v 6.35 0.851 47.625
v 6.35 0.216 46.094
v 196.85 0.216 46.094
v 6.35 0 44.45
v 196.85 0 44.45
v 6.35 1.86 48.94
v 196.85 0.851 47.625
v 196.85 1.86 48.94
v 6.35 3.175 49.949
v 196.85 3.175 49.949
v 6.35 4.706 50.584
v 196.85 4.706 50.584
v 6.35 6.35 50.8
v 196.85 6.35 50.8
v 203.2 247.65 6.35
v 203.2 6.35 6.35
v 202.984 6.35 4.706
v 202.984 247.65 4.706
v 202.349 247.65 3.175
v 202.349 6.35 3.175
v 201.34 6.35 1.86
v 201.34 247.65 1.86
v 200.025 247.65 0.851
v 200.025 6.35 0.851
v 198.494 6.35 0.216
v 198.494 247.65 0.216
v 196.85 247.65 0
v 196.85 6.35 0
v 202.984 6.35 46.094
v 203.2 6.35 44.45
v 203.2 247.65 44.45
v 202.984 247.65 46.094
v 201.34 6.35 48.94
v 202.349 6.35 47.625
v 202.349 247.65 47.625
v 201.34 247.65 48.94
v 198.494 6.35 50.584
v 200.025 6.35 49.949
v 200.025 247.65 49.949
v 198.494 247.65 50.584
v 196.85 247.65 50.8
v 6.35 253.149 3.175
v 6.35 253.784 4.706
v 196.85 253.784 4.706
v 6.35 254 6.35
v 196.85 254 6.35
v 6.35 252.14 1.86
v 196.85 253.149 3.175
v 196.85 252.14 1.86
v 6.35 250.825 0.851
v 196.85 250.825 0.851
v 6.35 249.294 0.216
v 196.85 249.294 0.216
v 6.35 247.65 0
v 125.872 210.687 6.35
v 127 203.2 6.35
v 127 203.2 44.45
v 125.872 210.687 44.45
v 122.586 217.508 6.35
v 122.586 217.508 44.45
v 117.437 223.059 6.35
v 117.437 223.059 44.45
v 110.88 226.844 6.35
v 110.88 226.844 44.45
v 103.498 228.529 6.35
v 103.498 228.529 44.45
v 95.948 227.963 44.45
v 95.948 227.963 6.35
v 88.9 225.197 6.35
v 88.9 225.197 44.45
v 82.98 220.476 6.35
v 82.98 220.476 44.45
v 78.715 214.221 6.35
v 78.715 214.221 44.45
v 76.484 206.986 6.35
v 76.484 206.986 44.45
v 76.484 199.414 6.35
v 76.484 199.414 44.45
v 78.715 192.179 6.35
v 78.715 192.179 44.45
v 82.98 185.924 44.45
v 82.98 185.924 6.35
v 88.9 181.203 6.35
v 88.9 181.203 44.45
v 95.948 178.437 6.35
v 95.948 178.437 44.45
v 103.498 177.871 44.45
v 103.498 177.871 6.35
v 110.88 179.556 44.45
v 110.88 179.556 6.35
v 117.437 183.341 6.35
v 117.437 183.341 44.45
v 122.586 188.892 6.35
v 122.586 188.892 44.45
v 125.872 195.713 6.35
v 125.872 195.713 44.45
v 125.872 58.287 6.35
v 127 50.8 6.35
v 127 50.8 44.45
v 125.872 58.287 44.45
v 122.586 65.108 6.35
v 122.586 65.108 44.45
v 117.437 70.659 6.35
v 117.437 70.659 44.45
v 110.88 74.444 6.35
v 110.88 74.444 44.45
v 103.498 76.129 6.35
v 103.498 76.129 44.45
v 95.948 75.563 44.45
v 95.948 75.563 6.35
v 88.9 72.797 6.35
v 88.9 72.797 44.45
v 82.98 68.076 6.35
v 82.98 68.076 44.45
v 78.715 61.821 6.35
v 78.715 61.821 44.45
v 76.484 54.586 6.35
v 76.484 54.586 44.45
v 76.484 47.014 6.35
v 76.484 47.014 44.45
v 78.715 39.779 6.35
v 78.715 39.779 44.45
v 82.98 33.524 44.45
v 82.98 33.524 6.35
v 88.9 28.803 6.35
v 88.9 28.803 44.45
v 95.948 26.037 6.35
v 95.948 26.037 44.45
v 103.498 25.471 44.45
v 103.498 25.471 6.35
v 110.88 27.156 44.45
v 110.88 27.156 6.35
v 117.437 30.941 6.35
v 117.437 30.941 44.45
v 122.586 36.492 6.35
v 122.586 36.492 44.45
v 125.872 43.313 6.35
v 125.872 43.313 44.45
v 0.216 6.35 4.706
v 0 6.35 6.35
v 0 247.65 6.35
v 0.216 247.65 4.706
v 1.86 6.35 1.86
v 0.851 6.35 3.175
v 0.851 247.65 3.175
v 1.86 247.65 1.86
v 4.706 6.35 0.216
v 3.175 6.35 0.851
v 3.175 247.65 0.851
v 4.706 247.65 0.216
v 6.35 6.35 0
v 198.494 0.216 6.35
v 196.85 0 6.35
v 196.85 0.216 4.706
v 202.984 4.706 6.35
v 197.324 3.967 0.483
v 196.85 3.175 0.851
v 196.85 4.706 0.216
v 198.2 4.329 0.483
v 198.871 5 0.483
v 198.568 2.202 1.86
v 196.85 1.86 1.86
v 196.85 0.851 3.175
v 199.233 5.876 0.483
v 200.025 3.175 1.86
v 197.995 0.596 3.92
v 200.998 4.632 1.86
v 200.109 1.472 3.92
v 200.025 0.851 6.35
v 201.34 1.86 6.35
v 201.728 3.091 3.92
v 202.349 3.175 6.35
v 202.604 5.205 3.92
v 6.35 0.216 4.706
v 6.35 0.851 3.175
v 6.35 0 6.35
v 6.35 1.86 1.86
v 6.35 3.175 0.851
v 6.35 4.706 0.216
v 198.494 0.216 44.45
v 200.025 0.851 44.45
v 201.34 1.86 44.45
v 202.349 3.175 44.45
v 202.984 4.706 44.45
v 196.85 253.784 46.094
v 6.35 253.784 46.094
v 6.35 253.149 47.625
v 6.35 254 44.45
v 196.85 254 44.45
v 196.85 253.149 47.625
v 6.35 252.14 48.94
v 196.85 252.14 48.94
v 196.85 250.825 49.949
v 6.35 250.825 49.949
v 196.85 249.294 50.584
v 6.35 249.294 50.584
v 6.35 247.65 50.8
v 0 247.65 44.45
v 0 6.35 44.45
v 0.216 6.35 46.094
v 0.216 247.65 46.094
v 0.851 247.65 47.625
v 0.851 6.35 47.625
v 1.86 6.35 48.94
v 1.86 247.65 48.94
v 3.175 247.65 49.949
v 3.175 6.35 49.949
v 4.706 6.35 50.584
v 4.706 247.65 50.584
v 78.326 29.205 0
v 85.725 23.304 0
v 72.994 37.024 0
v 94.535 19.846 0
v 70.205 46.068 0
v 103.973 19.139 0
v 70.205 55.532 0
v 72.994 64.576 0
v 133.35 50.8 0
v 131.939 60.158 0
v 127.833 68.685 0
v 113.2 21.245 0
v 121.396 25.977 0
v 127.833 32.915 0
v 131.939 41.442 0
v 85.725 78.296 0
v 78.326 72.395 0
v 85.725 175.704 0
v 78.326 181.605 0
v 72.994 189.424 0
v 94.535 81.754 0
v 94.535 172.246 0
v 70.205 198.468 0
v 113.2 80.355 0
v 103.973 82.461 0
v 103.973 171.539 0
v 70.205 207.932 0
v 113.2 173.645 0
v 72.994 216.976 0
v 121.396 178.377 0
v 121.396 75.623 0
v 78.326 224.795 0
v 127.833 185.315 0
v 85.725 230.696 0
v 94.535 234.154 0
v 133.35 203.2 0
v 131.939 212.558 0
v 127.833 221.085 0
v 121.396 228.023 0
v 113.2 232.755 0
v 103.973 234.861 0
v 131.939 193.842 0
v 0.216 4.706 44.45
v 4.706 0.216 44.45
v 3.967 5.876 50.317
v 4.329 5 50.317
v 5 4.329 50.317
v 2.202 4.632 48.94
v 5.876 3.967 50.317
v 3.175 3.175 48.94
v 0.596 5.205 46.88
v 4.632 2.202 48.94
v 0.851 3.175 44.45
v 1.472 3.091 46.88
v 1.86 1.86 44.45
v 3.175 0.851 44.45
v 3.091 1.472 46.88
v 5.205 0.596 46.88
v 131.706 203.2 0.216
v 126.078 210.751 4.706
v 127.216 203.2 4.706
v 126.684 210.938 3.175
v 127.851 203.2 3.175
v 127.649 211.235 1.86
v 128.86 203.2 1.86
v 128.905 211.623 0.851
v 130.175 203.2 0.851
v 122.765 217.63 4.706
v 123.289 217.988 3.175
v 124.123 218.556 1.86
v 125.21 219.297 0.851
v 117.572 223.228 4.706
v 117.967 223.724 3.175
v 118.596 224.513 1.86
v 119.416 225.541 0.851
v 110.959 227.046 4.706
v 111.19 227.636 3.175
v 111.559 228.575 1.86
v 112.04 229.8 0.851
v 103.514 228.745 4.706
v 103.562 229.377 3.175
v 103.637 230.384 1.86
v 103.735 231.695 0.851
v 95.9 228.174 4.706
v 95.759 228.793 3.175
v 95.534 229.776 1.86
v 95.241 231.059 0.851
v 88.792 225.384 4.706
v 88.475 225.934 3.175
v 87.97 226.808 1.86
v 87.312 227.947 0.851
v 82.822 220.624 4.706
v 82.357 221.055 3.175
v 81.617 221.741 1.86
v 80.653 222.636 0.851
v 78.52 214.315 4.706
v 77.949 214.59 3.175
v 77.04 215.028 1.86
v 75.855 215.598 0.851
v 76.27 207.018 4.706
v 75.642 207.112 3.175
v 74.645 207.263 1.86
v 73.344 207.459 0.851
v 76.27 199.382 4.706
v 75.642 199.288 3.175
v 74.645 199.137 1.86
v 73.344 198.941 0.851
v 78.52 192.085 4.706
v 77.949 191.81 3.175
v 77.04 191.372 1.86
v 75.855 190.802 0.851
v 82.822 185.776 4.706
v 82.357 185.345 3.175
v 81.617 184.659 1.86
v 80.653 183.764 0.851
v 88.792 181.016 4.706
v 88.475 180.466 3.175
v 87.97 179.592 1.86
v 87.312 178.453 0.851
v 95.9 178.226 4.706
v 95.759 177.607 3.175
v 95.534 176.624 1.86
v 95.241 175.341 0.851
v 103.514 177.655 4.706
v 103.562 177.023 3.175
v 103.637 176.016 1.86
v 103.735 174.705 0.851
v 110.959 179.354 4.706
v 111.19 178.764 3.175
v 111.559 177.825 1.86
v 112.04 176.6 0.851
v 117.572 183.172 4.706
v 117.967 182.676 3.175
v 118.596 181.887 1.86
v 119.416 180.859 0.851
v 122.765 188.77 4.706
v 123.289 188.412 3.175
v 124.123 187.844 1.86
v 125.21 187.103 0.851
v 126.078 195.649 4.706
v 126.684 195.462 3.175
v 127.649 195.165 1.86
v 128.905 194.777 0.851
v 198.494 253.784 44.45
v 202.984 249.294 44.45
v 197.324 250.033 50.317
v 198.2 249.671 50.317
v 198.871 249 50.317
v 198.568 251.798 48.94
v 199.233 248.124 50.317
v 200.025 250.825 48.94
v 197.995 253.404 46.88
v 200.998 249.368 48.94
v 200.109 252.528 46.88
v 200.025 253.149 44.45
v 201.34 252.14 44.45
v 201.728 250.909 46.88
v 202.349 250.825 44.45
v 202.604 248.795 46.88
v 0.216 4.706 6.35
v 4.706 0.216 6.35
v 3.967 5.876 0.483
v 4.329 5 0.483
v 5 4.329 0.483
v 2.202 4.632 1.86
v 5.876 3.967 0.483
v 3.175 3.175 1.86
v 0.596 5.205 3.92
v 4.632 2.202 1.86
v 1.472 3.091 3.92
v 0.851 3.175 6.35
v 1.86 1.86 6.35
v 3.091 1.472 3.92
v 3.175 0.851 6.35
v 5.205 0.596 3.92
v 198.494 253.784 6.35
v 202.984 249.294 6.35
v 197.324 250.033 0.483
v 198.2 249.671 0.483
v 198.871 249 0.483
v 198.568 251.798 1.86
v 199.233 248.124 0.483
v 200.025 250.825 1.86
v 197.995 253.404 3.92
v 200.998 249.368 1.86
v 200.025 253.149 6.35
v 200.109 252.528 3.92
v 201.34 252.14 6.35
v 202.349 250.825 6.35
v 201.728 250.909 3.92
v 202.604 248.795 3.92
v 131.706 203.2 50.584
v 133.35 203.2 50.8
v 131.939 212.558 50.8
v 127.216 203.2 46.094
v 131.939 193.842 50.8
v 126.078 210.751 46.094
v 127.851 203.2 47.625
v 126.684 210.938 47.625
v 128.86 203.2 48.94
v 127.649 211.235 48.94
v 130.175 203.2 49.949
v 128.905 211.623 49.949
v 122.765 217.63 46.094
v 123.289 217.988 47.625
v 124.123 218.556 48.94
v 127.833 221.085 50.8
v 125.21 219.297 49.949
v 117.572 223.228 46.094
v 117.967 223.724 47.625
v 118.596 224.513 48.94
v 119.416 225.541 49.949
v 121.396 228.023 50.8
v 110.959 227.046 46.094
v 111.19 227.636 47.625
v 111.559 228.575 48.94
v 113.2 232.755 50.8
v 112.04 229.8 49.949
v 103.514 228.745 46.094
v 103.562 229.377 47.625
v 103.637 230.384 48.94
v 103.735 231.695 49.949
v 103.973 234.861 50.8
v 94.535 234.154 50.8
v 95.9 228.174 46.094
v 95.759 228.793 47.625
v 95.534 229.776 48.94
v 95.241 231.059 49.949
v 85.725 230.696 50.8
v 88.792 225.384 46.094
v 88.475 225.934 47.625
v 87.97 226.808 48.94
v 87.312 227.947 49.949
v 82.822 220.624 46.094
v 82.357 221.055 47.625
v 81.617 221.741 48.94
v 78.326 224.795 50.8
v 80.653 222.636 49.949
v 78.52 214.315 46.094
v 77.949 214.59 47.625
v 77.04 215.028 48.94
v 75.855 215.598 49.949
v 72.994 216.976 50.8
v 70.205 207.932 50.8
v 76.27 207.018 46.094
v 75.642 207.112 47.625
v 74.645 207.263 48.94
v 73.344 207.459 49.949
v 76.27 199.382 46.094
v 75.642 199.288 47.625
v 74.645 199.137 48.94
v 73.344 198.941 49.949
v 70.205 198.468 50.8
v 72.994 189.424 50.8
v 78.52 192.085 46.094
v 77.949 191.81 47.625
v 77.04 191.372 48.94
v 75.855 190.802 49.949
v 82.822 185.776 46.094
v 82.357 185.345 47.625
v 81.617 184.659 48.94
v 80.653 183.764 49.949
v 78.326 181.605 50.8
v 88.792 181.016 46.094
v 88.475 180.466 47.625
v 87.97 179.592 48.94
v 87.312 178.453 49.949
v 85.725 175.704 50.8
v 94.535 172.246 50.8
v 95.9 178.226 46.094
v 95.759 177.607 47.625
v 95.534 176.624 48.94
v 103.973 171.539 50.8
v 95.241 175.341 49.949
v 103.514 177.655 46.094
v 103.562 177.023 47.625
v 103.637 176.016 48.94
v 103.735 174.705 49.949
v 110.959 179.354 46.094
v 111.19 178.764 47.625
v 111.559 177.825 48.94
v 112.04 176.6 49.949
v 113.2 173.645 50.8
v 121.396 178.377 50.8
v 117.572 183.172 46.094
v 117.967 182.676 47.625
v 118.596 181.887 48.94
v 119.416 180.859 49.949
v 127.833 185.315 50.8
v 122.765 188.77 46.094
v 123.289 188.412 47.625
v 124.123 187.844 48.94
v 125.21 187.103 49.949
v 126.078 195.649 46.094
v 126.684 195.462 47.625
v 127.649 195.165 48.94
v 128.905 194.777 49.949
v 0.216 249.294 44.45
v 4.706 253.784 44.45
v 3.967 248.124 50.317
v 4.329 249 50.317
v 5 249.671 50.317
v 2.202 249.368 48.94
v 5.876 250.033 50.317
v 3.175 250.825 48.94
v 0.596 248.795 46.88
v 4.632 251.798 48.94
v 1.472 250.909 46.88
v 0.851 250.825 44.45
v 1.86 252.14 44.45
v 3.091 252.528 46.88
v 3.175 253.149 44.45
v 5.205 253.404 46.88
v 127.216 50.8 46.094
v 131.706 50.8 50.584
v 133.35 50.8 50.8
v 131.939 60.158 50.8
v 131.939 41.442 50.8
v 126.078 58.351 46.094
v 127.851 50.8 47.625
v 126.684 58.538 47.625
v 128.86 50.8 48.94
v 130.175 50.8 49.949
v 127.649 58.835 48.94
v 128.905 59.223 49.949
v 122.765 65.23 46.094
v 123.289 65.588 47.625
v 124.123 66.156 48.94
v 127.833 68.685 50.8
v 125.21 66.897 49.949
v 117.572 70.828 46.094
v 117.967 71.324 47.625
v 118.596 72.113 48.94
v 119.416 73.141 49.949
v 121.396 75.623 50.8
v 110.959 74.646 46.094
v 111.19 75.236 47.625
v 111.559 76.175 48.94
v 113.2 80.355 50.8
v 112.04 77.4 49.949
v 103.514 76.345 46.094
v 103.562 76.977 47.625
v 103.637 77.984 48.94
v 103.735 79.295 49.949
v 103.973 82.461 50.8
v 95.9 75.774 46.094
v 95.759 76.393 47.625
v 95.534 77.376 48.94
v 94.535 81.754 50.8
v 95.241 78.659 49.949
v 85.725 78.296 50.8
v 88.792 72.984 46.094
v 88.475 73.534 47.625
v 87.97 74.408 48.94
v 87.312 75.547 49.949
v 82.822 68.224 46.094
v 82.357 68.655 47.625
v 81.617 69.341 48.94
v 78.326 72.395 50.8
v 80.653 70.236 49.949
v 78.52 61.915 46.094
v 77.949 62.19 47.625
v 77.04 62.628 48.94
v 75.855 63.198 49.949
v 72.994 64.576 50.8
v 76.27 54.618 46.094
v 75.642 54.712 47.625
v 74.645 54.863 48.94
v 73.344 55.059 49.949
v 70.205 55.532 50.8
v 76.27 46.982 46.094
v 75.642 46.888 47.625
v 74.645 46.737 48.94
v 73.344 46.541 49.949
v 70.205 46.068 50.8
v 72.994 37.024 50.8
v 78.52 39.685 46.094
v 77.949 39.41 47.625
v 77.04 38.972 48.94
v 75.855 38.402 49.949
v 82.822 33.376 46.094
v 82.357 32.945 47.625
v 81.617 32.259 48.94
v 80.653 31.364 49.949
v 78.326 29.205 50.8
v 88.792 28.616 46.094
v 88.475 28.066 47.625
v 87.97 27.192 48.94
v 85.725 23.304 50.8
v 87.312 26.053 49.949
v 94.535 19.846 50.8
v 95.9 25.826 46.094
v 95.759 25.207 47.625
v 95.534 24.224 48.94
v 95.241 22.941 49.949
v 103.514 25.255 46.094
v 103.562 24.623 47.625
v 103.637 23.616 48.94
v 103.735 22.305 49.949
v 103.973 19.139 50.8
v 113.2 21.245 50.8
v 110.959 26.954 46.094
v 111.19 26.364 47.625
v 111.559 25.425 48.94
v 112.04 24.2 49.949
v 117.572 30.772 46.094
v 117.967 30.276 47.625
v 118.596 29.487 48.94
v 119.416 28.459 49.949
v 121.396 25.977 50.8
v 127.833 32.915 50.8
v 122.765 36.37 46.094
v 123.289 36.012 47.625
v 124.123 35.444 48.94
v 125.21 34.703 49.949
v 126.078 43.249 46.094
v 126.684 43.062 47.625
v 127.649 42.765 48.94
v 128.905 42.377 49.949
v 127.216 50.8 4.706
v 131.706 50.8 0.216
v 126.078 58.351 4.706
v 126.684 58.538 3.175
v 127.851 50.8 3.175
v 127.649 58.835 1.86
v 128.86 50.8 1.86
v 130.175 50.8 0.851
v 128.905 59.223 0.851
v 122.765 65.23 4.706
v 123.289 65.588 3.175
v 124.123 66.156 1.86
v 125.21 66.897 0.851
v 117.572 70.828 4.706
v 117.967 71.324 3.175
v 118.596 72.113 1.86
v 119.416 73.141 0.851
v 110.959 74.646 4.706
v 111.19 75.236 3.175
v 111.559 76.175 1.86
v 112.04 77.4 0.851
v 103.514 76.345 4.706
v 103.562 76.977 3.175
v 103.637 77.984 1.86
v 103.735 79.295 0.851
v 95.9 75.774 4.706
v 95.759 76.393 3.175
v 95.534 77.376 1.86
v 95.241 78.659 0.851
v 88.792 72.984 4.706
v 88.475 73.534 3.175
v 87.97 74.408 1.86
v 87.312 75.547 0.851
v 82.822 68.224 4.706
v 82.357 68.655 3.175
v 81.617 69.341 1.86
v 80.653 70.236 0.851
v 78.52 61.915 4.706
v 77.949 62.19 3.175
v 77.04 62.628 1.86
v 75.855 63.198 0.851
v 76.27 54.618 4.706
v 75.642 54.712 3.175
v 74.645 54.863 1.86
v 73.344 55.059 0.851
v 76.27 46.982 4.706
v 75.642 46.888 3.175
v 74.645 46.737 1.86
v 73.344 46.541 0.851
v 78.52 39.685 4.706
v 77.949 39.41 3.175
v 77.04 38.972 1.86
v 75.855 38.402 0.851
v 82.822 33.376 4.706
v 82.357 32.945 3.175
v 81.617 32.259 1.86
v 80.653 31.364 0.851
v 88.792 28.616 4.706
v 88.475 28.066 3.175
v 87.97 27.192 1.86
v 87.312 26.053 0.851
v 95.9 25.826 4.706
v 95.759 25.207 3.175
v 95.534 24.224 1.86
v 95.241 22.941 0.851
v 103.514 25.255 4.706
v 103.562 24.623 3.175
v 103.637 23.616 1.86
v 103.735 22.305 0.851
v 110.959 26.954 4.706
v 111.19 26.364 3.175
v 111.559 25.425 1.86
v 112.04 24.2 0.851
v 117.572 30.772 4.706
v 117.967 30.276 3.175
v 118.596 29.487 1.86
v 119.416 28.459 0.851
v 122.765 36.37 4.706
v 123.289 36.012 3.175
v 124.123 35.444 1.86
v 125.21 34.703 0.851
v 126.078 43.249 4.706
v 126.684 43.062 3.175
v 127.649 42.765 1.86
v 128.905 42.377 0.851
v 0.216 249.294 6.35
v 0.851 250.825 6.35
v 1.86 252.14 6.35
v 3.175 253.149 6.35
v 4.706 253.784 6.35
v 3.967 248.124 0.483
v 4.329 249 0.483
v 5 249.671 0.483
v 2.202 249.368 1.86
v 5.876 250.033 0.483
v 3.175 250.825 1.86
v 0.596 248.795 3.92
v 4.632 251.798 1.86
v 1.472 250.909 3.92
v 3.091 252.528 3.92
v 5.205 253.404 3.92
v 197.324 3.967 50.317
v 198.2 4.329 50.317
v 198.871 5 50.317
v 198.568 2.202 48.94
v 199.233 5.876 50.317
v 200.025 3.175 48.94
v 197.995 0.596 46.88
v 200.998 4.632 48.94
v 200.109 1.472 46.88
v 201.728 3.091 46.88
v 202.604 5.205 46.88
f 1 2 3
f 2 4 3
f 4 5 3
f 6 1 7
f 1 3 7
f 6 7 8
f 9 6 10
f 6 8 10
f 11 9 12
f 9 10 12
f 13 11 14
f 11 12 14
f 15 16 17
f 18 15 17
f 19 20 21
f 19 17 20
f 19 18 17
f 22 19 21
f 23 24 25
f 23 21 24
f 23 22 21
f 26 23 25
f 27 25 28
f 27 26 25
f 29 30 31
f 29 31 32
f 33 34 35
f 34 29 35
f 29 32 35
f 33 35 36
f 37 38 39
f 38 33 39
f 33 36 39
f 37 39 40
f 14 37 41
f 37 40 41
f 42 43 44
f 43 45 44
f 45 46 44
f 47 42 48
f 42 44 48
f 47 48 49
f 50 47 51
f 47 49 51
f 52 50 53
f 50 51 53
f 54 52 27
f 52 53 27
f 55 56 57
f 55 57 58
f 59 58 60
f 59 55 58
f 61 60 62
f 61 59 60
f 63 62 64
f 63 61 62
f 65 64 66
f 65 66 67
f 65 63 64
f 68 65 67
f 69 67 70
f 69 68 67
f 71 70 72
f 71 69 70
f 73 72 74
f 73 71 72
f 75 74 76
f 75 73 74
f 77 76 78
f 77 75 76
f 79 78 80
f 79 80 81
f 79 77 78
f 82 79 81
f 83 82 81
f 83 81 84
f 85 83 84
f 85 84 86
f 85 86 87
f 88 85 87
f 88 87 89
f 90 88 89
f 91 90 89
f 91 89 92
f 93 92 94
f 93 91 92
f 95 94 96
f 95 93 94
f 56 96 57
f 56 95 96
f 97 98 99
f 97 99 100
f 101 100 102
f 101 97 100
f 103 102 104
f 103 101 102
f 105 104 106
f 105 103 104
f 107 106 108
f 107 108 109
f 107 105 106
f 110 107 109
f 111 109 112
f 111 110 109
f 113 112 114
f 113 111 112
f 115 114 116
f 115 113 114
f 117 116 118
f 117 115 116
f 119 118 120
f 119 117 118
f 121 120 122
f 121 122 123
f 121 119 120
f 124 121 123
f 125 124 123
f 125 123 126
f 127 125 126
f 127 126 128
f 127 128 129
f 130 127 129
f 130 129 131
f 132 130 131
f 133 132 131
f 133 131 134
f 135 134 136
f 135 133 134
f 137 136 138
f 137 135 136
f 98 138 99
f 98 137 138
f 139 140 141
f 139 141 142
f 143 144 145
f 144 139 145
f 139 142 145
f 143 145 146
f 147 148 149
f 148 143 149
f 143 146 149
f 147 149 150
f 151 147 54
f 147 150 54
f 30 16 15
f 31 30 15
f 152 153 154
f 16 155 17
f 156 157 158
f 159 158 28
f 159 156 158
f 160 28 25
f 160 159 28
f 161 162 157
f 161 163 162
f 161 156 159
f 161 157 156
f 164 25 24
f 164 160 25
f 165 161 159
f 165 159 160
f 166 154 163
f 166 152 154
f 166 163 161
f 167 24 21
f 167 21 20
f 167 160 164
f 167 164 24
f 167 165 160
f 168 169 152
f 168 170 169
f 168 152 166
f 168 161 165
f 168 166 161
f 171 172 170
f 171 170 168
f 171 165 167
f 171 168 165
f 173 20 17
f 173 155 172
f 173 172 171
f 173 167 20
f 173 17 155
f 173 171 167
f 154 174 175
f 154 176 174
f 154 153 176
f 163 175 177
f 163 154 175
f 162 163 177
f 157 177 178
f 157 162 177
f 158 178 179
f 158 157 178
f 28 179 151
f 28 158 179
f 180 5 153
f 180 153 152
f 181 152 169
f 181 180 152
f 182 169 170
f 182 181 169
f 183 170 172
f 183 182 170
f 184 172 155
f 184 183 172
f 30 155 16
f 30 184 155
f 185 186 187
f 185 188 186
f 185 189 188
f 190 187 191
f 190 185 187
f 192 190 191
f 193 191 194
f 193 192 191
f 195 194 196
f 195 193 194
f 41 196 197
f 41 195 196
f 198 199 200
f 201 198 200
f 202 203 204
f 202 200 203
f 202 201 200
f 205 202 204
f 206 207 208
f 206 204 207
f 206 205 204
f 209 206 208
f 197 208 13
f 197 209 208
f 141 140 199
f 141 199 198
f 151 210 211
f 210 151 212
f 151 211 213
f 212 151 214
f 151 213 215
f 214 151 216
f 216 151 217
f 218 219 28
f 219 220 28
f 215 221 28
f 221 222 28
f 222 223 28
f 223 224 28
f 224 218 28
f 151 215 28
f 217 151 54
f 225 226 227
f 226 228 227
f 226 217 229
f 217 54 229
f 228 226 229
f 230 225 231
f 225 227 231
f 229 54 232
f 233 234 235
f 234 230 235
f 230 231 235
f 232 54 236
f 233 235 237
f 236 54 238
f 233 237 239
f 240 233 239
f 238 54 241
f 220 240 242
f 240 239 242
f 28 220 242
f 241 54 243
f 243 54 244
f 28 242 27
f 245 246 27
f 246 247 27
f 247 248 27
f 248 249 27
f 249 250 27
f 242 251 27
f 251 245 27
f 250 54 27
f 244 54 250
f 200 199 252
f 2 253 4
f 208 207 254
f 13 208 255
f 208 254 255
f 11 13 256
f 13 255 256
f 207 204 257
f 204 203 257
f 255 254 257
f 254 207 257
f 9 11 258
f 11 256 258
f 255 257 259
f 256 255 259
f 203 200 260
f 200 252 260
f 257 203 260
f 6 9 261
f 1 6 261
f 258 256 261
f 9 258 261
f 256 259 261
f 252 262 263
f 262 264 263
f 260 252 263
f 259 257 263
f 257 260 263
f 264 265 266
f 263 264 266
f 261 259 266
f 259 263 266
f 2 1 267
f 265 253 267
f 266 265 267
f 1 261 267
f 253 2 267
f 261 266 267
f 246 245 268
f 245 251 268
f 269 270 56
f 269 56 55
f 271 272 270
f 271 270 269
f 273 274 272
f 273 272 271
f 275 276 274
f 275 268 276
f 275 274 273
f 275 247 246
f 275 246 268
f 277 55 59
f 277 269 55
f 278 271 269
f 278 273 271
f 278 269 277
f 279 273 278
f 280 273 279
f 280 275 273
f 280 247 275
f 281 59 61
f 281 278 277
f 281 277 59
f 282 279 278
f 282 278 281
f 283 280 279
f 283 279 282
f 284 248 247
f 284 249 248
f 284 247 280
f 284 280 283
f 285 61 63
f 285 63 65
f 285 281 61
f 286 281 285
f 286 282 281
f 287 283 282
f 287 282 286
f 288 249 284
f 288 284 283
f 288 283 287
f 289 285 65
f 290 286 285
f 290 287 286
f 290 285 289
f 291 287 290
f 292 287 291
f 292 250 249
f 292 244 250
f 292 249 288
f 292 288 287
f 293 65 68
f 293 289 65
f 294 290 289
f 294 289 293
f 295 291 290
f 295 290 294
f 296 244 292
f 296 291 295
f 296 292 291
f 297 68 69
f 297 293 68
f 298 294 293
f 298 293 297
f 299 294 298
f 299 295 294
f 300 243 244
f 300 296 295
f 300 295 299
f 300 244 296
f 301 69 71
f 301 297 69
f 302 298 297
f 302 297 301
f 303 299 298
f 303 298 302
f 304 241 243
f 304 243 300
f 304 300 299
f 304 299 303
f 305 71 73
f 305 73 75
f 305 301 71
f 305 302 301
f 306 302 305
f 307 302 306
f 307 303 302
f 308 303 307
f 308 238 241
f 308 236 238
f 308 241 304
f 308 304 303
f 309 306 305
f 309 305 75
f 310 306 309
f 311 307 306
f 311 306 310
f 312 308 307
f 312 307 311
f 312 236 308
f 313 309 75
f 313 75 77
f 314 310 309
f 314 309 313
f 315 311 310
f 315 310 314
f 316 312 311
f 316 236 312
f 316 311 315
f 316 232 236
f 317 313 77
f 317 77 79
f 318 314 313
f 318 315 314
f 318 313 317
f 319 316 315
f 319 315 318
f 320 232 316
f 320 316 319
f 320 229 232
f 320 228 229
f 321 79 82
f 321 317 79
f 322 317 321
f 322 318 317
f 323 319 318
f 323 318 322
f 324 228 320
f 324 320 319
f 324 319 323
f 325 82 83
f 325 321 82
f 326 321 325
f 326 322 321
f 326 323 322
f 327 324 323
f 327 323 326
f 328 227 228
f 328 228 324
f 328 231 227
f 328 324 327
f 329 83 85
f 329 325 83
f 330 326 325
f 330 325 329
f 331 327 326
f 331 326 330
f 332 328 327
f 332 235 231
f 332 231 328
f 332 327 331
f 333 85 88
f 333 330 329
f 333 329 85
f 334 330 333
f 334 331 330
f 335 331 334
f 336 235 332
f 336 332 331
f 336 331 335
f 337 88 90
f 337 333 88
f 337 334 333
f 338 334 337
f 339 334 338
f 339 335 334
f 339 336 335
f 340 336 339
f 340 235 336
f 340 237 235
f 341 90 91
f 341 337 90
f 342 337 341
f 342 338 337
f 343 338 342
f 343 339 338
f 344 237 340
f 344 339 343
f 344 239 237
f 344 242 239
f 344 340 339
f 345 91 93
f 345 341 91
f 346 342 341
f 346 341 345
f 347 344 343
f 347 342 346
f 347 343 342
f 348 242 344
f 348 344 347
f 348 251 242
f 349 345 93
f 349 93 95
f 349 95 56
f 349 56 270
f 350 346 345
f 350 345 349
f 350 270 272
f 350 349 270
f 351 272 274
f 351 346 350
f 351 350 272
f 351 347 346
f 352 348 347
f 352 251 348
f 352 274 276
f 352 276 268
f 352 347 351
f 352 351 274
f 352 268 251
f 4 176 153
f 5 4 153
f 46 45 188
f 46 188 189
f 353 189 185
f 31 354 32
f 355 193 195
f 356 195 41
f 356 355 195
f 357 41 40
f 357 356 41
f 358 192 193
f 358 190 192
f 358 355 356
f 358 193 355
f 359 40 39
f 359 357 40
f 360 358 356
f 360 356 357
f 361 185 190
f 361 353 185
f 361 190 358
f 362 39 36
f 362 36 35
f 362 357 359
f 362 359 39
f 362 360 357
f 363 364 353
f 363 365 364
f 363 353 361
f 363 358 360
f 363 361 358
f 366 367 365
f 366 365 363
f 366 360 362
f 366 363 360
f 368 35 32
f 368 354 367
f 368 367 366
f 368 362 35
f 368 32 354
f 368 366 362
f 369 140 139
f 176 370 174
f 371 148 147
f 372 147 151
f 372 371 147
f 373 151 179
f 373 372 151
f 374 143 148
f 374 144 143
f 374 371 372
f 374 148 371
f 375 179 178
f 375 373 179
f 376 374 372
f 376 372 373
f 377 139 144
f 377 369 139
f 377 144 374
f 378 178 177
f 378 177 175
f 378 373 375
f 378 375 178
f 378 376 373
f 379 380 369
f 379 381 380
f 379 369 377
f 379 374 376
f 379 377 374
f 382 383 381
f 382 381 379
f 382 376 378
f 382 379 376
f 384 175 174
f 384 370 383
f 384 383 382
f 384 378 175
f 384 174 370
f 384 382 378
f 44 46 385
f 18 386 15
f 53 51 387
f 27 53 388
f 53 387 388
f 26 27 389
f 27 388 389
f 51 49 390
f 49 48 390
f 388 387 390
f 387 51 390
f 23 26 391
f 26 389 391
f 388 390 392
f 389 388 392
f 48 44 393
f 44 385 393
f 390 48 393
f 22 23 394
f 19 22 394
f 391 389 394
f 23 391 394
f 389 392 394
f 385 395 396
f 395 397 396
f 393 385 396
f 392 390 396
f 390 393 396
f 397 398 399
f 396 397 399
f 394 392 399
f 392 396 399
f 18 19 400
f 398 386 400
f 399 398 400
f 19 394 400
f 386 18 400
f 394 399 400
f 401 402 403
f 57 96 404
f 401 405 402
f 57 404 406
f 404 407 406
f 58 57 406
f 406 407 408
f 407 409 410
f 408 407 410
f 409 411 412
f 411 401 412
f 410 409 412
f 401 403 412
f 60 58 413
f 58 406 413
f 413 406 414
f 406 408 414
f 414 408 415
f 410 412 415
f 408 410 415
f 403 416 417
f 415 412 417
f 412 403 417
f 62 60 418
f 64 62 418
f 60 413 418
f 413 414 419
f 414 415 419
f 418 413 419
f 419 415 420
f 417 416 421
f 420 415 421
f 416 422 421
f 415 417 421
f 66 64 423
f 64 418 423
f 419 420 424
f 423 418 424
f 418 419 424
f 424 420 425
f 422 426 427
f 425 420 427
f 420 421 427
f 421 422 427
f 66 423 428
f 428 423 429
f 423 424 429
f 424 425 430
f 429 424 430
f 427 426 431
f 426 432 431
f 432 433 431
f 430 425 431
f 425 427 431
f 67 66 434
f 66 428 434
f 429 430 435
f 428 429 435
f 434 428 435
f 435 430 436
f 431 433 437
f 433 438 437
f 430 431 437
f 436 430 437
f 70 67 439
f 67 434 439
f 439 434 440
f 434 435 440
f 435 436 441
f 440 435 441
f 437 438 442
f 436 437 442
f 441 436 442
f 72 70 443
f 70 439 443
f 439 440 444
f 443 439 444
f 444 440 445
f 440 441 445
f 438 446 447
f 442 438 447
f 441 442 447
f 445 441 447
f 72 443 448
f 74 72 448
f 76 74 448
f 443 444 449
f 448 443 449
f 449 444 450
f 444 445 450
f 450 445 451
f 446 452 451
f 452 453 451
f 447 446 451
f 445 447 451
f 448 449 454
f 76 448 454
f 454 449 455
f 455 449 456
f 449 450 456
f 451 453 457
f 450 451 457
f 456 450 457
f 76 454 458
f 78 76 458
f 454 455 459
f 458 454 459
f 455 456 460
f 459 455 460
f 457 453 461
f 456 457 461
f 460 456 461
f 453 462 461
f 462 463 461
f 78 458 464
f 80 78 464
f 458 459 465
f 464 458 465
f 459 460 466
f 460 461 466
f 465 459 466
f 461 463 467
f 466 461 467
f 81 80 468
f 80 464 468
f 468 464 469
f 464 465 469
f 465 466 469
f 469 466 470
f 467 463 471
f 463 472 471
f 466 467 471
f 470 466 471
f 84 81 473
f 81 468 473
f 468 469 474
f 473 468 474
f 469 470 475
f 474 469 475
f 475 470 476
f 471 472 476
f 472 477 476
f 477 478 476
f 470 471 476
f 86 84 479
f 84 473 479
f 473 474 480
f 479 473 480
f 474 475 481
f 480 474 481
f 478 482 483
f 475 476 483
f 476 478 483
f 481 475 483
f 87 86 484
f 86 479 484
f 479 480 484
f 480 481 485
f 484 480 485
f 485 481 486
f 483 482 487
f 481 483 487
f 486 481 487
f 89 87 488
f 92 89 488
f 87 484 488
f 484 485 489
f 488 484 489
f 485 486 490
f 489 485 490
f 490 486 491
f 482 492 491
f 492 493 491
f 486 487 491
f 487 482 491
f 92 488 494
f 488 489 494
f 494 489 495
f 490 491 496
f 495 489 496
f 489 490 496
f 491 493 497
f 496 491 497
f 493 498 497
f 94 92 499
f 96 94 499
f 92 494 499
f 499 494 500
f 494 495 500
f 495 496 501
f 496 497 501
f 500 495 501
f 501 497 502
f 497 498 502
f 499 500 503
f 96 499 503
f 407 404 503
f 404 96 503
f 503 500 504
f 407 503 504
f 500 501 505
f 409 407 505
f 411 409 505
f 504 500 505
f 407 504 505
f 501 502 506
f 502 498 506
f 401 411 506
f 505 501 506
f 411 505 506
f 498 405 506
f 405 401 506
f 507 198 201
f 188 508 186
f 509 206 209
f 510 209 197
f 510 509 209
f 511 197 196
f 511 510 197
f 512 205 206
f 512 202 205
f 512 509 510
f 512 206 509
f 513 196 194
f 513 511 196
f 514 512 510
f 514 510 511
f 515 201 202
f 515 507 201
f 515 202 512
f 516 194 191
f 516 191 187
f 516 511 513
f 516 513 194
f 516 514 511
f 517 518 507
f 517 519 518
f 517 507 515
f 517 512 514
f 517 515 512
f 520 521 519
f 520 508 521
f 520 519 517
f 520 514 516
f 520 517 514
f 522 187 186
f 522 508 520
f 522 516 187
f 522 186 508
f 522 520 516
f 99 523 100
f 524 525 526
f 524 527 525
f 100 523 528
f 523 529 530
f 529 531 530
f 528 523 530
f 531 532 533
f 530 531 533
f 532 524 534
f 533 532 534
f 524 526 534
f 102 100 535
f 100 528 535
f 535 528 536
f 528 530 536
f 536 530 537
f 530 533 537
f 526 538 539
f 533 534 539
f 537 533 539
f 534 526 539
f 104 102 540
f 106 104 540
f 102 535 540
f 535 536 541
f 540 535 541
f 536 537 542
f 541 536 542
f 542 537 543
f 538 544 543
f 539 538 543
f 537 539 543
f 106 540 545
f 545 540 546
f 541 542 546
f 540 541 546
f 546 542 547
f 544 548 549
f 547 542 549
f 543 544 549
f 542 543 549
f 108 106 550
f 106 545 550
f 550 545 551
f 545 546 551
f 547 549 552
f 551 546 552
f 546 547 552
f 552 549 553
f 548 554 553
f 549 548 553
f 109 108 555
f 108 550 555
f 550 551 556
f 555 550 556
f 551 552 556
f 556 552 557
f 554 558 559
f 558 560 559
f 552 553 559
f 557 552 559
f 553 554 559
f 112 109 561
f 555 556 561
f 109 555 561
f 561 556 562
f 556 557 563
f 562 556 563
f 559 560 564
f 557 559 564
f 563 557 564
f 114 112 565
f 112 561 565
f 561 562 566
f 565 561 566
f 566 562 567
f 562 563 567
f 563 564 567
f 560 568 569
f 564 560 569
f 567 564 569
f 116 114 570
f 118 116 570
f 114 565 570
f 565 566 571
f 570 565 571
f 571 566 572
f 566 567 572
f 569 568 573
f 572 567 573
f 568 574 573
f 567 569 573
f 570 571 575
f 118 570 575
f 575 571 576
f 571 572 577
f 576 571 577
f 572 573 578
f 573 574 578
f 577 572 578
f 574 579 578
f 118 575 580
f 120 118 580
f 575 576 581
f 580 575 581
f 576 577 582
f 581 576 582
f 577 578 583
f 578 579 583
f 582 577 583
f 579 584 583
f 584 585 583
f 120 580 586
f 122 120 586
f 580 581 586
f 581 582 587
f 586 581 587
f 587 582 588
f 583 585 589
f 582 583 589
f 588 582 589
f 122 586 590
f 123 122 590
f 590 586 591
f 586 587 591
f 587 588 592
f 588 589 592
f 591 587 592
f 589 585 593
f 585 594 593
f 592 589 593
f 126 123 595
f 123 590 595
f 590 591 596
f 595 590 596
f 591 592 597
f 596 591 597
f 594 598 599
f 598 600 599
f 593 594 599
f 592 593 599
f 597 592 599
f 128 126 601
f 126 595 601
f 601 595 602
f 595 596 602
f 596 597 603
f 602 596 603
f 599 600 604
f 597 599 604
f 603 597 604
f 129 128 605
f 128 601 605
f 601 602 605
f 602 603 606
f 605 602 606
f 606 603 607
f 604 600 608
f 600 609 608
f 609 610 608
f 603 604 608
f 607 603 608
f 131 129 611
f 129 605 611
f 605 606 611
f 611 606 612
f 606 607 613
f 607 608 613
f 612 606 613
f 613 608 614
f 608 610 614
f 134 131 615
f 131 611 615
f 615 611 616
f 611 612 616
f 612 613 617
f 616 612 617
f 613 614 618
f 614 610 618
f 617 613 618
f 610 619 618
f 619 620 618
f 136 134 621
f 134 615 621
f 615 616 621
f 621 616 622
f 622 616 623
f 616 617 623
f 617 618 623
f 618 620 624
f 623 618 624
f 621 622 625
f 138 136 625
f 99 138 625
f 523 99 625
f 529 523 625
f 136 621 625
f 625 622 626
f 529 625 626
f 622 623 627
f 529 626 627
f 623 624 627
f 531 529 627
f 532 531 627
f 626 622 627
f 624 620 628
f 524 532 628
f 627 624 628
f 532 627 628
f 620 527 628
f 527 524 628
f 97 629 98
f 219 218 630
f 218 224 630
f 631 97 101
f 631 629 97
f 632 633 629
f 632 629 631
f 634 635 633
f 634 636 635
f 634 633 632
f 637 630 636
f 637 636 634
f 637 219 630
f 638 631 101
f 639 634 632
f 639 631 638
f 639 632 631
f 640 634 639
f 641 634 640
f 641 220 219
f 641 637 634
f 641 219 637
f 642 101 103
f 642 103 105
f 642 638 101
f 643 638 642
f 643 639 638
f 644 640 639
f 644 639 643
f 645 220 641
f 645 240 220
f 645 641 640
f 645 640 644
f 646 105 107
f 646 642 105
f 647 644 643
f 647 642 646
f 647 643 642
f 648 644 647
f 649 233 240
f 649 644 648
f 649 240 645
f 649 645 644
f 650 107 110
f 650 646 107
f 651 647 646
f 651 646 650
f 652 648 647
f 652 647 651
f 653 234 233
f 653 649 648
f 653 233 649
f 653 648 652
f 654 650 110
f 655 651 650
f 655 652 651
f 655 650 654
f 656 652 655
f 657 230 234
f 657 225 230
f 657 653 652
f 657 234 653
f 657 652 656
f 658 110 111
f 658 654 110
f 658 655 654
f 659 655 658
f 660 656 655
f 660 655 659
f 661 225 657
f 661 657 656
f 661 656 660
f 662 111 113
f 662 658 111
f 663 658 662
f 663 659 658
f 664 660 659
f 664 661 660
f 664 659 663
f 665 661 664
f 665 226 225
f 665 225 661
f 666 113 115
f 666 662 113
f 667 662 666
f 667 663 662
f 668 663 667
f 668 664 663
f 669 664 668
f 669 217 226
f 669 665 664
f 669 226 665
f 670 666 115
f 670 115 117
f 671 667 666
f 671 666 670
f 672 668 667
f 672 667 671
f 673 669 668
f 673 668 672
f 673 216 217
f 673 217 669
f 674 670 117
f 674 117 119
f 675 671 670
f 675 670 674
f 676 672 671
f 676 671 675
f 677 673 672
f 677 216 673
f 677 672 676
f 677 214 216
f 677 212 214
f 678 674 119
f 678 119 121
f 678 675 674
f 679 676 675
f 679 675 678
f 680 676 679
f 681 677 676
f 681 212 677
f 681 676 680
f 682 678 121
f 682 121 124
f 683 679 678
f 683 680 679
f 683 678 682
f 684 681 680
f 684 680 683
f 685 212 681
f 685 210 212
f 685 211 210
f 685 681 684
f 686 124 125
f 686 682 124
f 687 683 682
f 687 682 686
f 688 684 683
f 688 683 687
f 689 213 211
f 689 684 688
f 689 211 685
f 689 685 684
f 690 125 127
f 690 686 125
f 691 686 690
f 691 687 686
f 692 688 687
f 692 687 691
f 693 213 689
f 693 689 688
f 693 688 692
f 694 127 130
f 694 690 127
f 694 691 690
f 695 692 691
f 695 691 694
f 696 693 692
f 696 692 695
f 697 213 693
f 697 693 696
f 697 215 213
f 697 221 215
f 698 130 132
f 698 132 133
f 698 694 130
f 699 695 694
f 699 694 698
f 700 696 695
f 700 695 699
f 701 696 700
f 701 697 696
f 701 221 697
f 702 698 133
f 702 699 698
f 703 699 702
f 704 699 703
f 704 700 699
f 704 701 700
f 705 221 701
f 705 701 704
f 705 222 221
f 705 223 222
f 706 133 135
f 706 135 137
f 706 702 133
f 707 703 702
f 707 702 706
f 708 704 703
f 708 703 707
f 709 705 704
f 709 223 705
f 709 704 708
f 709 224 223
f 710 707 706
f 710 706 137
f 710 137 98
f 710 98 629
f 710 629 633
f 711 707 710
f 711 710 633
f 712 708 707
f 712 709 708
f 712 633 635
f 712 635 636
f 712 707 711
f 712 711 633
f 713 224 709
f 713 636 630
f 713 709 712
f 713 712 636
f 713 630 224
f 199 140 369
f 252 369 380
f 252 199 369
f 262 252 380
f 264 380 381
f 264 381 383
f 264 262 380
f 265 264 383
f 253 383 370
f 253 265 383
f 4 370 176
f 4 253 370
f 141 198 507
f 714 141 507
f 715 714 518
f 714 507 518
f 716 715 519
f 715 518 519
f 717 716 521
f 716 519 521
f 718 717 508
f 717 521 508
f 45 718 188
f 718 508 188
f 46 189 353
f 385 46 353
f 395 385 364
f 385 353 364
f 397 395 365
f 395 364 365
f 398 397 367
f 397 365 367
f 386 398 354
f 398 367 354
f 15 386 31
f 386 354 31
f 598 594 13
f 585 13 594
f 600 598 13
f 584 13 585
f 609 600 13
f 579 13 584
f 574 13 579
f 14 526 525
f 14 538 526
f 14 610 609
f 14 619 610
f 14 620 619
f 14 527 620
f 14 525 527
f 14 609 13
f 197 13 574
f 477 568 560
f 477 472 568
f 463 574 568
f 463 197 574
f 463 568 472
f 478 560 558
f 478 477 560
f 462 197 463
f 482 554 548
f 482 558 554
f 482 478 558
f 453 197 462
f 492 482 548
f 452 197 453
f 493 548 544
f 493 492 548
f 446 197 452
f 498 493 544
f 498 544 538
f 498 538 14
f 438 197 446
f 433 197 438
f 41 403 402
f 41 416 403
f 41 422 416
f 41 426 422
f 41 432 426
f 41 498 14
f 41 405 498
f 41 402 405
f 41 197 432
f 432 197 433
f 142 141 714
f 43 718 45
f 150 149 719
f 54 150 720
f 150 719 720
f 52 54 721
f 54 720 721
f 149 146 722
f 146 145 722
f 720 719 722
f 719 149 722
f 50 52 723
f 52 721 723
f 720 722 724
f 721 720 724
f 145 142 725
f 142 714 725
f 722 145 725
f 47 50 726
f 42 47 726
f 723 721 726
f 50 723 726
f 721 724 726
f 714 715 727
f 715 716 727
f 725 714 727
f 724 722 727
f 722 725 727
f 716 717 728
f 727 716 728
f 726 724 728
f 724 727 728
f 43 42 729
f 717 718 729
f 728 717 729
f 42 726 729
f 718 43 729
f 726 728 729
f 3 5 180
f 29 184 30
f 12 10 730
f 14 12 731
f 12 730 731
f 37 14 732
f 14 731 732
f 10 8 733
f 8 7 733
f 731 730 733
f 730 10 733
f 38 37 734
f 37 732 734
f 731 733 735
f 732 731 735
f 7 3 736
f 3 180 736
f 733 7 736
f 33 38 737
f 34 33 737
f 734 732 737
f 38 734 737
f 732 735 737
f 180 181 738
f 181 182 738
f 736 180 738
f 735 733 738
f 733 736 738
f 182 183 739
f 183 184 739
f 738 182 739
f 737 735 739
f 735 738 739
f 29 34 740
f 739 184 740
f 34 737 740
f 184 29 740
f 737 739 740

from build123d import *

# Parameters (mm, degrees)
F0_W     = 203.2
F0_H     = 254
F0_R     = 25.4
F1_DEPTH = 50.8
F2_R     = 6.35


with BuildPart() as f1:
    # F0 (on Top) → F1 (new body)
    with BuildSketch(Plane.XY):
        with Locations((101.6, 127)):
            Rectangle(F0_W, F0_H)
        with Locations((101.6, 50.8)):
            Circle(F0_R, mode=Mode.SUBTRACT)
        with Locations((101.6, 203.2)):
            Circle(F0_R, mode=Mode.SUBTRACT)
    extrude(amount=F1_DEPTH)

    # F2
    f2_edges = [f1.edges().sort_by_distance(p)[0] for p in [
        (0, 254, 25.4),
        (0, 0, 25.4),
        (0, 127, 0),
        (0, 127, 50.8),
        (203.2, 254, 25.4),
        (101.6, 254, 0),
        (101.6, 254, 50.8),
        (76.2, 203.2, 50.8),
        (76.2, 50.8, 50.8),
        (127, 50.8, 25.4),
        (76.2, 50.8, 0),
        (127, 203.2, 25.4),
        (76.2, 203.2, 0),
        (203.2, 0, 25.4),
        (101.6, 0, 0),
        (101.6, 0, 50.8),
        (203.2, 127, 0),
        (203.2, 127, 50.8),
    ]]
    fillet(f2_edges, radius=F2_R)


solid = f1.part
